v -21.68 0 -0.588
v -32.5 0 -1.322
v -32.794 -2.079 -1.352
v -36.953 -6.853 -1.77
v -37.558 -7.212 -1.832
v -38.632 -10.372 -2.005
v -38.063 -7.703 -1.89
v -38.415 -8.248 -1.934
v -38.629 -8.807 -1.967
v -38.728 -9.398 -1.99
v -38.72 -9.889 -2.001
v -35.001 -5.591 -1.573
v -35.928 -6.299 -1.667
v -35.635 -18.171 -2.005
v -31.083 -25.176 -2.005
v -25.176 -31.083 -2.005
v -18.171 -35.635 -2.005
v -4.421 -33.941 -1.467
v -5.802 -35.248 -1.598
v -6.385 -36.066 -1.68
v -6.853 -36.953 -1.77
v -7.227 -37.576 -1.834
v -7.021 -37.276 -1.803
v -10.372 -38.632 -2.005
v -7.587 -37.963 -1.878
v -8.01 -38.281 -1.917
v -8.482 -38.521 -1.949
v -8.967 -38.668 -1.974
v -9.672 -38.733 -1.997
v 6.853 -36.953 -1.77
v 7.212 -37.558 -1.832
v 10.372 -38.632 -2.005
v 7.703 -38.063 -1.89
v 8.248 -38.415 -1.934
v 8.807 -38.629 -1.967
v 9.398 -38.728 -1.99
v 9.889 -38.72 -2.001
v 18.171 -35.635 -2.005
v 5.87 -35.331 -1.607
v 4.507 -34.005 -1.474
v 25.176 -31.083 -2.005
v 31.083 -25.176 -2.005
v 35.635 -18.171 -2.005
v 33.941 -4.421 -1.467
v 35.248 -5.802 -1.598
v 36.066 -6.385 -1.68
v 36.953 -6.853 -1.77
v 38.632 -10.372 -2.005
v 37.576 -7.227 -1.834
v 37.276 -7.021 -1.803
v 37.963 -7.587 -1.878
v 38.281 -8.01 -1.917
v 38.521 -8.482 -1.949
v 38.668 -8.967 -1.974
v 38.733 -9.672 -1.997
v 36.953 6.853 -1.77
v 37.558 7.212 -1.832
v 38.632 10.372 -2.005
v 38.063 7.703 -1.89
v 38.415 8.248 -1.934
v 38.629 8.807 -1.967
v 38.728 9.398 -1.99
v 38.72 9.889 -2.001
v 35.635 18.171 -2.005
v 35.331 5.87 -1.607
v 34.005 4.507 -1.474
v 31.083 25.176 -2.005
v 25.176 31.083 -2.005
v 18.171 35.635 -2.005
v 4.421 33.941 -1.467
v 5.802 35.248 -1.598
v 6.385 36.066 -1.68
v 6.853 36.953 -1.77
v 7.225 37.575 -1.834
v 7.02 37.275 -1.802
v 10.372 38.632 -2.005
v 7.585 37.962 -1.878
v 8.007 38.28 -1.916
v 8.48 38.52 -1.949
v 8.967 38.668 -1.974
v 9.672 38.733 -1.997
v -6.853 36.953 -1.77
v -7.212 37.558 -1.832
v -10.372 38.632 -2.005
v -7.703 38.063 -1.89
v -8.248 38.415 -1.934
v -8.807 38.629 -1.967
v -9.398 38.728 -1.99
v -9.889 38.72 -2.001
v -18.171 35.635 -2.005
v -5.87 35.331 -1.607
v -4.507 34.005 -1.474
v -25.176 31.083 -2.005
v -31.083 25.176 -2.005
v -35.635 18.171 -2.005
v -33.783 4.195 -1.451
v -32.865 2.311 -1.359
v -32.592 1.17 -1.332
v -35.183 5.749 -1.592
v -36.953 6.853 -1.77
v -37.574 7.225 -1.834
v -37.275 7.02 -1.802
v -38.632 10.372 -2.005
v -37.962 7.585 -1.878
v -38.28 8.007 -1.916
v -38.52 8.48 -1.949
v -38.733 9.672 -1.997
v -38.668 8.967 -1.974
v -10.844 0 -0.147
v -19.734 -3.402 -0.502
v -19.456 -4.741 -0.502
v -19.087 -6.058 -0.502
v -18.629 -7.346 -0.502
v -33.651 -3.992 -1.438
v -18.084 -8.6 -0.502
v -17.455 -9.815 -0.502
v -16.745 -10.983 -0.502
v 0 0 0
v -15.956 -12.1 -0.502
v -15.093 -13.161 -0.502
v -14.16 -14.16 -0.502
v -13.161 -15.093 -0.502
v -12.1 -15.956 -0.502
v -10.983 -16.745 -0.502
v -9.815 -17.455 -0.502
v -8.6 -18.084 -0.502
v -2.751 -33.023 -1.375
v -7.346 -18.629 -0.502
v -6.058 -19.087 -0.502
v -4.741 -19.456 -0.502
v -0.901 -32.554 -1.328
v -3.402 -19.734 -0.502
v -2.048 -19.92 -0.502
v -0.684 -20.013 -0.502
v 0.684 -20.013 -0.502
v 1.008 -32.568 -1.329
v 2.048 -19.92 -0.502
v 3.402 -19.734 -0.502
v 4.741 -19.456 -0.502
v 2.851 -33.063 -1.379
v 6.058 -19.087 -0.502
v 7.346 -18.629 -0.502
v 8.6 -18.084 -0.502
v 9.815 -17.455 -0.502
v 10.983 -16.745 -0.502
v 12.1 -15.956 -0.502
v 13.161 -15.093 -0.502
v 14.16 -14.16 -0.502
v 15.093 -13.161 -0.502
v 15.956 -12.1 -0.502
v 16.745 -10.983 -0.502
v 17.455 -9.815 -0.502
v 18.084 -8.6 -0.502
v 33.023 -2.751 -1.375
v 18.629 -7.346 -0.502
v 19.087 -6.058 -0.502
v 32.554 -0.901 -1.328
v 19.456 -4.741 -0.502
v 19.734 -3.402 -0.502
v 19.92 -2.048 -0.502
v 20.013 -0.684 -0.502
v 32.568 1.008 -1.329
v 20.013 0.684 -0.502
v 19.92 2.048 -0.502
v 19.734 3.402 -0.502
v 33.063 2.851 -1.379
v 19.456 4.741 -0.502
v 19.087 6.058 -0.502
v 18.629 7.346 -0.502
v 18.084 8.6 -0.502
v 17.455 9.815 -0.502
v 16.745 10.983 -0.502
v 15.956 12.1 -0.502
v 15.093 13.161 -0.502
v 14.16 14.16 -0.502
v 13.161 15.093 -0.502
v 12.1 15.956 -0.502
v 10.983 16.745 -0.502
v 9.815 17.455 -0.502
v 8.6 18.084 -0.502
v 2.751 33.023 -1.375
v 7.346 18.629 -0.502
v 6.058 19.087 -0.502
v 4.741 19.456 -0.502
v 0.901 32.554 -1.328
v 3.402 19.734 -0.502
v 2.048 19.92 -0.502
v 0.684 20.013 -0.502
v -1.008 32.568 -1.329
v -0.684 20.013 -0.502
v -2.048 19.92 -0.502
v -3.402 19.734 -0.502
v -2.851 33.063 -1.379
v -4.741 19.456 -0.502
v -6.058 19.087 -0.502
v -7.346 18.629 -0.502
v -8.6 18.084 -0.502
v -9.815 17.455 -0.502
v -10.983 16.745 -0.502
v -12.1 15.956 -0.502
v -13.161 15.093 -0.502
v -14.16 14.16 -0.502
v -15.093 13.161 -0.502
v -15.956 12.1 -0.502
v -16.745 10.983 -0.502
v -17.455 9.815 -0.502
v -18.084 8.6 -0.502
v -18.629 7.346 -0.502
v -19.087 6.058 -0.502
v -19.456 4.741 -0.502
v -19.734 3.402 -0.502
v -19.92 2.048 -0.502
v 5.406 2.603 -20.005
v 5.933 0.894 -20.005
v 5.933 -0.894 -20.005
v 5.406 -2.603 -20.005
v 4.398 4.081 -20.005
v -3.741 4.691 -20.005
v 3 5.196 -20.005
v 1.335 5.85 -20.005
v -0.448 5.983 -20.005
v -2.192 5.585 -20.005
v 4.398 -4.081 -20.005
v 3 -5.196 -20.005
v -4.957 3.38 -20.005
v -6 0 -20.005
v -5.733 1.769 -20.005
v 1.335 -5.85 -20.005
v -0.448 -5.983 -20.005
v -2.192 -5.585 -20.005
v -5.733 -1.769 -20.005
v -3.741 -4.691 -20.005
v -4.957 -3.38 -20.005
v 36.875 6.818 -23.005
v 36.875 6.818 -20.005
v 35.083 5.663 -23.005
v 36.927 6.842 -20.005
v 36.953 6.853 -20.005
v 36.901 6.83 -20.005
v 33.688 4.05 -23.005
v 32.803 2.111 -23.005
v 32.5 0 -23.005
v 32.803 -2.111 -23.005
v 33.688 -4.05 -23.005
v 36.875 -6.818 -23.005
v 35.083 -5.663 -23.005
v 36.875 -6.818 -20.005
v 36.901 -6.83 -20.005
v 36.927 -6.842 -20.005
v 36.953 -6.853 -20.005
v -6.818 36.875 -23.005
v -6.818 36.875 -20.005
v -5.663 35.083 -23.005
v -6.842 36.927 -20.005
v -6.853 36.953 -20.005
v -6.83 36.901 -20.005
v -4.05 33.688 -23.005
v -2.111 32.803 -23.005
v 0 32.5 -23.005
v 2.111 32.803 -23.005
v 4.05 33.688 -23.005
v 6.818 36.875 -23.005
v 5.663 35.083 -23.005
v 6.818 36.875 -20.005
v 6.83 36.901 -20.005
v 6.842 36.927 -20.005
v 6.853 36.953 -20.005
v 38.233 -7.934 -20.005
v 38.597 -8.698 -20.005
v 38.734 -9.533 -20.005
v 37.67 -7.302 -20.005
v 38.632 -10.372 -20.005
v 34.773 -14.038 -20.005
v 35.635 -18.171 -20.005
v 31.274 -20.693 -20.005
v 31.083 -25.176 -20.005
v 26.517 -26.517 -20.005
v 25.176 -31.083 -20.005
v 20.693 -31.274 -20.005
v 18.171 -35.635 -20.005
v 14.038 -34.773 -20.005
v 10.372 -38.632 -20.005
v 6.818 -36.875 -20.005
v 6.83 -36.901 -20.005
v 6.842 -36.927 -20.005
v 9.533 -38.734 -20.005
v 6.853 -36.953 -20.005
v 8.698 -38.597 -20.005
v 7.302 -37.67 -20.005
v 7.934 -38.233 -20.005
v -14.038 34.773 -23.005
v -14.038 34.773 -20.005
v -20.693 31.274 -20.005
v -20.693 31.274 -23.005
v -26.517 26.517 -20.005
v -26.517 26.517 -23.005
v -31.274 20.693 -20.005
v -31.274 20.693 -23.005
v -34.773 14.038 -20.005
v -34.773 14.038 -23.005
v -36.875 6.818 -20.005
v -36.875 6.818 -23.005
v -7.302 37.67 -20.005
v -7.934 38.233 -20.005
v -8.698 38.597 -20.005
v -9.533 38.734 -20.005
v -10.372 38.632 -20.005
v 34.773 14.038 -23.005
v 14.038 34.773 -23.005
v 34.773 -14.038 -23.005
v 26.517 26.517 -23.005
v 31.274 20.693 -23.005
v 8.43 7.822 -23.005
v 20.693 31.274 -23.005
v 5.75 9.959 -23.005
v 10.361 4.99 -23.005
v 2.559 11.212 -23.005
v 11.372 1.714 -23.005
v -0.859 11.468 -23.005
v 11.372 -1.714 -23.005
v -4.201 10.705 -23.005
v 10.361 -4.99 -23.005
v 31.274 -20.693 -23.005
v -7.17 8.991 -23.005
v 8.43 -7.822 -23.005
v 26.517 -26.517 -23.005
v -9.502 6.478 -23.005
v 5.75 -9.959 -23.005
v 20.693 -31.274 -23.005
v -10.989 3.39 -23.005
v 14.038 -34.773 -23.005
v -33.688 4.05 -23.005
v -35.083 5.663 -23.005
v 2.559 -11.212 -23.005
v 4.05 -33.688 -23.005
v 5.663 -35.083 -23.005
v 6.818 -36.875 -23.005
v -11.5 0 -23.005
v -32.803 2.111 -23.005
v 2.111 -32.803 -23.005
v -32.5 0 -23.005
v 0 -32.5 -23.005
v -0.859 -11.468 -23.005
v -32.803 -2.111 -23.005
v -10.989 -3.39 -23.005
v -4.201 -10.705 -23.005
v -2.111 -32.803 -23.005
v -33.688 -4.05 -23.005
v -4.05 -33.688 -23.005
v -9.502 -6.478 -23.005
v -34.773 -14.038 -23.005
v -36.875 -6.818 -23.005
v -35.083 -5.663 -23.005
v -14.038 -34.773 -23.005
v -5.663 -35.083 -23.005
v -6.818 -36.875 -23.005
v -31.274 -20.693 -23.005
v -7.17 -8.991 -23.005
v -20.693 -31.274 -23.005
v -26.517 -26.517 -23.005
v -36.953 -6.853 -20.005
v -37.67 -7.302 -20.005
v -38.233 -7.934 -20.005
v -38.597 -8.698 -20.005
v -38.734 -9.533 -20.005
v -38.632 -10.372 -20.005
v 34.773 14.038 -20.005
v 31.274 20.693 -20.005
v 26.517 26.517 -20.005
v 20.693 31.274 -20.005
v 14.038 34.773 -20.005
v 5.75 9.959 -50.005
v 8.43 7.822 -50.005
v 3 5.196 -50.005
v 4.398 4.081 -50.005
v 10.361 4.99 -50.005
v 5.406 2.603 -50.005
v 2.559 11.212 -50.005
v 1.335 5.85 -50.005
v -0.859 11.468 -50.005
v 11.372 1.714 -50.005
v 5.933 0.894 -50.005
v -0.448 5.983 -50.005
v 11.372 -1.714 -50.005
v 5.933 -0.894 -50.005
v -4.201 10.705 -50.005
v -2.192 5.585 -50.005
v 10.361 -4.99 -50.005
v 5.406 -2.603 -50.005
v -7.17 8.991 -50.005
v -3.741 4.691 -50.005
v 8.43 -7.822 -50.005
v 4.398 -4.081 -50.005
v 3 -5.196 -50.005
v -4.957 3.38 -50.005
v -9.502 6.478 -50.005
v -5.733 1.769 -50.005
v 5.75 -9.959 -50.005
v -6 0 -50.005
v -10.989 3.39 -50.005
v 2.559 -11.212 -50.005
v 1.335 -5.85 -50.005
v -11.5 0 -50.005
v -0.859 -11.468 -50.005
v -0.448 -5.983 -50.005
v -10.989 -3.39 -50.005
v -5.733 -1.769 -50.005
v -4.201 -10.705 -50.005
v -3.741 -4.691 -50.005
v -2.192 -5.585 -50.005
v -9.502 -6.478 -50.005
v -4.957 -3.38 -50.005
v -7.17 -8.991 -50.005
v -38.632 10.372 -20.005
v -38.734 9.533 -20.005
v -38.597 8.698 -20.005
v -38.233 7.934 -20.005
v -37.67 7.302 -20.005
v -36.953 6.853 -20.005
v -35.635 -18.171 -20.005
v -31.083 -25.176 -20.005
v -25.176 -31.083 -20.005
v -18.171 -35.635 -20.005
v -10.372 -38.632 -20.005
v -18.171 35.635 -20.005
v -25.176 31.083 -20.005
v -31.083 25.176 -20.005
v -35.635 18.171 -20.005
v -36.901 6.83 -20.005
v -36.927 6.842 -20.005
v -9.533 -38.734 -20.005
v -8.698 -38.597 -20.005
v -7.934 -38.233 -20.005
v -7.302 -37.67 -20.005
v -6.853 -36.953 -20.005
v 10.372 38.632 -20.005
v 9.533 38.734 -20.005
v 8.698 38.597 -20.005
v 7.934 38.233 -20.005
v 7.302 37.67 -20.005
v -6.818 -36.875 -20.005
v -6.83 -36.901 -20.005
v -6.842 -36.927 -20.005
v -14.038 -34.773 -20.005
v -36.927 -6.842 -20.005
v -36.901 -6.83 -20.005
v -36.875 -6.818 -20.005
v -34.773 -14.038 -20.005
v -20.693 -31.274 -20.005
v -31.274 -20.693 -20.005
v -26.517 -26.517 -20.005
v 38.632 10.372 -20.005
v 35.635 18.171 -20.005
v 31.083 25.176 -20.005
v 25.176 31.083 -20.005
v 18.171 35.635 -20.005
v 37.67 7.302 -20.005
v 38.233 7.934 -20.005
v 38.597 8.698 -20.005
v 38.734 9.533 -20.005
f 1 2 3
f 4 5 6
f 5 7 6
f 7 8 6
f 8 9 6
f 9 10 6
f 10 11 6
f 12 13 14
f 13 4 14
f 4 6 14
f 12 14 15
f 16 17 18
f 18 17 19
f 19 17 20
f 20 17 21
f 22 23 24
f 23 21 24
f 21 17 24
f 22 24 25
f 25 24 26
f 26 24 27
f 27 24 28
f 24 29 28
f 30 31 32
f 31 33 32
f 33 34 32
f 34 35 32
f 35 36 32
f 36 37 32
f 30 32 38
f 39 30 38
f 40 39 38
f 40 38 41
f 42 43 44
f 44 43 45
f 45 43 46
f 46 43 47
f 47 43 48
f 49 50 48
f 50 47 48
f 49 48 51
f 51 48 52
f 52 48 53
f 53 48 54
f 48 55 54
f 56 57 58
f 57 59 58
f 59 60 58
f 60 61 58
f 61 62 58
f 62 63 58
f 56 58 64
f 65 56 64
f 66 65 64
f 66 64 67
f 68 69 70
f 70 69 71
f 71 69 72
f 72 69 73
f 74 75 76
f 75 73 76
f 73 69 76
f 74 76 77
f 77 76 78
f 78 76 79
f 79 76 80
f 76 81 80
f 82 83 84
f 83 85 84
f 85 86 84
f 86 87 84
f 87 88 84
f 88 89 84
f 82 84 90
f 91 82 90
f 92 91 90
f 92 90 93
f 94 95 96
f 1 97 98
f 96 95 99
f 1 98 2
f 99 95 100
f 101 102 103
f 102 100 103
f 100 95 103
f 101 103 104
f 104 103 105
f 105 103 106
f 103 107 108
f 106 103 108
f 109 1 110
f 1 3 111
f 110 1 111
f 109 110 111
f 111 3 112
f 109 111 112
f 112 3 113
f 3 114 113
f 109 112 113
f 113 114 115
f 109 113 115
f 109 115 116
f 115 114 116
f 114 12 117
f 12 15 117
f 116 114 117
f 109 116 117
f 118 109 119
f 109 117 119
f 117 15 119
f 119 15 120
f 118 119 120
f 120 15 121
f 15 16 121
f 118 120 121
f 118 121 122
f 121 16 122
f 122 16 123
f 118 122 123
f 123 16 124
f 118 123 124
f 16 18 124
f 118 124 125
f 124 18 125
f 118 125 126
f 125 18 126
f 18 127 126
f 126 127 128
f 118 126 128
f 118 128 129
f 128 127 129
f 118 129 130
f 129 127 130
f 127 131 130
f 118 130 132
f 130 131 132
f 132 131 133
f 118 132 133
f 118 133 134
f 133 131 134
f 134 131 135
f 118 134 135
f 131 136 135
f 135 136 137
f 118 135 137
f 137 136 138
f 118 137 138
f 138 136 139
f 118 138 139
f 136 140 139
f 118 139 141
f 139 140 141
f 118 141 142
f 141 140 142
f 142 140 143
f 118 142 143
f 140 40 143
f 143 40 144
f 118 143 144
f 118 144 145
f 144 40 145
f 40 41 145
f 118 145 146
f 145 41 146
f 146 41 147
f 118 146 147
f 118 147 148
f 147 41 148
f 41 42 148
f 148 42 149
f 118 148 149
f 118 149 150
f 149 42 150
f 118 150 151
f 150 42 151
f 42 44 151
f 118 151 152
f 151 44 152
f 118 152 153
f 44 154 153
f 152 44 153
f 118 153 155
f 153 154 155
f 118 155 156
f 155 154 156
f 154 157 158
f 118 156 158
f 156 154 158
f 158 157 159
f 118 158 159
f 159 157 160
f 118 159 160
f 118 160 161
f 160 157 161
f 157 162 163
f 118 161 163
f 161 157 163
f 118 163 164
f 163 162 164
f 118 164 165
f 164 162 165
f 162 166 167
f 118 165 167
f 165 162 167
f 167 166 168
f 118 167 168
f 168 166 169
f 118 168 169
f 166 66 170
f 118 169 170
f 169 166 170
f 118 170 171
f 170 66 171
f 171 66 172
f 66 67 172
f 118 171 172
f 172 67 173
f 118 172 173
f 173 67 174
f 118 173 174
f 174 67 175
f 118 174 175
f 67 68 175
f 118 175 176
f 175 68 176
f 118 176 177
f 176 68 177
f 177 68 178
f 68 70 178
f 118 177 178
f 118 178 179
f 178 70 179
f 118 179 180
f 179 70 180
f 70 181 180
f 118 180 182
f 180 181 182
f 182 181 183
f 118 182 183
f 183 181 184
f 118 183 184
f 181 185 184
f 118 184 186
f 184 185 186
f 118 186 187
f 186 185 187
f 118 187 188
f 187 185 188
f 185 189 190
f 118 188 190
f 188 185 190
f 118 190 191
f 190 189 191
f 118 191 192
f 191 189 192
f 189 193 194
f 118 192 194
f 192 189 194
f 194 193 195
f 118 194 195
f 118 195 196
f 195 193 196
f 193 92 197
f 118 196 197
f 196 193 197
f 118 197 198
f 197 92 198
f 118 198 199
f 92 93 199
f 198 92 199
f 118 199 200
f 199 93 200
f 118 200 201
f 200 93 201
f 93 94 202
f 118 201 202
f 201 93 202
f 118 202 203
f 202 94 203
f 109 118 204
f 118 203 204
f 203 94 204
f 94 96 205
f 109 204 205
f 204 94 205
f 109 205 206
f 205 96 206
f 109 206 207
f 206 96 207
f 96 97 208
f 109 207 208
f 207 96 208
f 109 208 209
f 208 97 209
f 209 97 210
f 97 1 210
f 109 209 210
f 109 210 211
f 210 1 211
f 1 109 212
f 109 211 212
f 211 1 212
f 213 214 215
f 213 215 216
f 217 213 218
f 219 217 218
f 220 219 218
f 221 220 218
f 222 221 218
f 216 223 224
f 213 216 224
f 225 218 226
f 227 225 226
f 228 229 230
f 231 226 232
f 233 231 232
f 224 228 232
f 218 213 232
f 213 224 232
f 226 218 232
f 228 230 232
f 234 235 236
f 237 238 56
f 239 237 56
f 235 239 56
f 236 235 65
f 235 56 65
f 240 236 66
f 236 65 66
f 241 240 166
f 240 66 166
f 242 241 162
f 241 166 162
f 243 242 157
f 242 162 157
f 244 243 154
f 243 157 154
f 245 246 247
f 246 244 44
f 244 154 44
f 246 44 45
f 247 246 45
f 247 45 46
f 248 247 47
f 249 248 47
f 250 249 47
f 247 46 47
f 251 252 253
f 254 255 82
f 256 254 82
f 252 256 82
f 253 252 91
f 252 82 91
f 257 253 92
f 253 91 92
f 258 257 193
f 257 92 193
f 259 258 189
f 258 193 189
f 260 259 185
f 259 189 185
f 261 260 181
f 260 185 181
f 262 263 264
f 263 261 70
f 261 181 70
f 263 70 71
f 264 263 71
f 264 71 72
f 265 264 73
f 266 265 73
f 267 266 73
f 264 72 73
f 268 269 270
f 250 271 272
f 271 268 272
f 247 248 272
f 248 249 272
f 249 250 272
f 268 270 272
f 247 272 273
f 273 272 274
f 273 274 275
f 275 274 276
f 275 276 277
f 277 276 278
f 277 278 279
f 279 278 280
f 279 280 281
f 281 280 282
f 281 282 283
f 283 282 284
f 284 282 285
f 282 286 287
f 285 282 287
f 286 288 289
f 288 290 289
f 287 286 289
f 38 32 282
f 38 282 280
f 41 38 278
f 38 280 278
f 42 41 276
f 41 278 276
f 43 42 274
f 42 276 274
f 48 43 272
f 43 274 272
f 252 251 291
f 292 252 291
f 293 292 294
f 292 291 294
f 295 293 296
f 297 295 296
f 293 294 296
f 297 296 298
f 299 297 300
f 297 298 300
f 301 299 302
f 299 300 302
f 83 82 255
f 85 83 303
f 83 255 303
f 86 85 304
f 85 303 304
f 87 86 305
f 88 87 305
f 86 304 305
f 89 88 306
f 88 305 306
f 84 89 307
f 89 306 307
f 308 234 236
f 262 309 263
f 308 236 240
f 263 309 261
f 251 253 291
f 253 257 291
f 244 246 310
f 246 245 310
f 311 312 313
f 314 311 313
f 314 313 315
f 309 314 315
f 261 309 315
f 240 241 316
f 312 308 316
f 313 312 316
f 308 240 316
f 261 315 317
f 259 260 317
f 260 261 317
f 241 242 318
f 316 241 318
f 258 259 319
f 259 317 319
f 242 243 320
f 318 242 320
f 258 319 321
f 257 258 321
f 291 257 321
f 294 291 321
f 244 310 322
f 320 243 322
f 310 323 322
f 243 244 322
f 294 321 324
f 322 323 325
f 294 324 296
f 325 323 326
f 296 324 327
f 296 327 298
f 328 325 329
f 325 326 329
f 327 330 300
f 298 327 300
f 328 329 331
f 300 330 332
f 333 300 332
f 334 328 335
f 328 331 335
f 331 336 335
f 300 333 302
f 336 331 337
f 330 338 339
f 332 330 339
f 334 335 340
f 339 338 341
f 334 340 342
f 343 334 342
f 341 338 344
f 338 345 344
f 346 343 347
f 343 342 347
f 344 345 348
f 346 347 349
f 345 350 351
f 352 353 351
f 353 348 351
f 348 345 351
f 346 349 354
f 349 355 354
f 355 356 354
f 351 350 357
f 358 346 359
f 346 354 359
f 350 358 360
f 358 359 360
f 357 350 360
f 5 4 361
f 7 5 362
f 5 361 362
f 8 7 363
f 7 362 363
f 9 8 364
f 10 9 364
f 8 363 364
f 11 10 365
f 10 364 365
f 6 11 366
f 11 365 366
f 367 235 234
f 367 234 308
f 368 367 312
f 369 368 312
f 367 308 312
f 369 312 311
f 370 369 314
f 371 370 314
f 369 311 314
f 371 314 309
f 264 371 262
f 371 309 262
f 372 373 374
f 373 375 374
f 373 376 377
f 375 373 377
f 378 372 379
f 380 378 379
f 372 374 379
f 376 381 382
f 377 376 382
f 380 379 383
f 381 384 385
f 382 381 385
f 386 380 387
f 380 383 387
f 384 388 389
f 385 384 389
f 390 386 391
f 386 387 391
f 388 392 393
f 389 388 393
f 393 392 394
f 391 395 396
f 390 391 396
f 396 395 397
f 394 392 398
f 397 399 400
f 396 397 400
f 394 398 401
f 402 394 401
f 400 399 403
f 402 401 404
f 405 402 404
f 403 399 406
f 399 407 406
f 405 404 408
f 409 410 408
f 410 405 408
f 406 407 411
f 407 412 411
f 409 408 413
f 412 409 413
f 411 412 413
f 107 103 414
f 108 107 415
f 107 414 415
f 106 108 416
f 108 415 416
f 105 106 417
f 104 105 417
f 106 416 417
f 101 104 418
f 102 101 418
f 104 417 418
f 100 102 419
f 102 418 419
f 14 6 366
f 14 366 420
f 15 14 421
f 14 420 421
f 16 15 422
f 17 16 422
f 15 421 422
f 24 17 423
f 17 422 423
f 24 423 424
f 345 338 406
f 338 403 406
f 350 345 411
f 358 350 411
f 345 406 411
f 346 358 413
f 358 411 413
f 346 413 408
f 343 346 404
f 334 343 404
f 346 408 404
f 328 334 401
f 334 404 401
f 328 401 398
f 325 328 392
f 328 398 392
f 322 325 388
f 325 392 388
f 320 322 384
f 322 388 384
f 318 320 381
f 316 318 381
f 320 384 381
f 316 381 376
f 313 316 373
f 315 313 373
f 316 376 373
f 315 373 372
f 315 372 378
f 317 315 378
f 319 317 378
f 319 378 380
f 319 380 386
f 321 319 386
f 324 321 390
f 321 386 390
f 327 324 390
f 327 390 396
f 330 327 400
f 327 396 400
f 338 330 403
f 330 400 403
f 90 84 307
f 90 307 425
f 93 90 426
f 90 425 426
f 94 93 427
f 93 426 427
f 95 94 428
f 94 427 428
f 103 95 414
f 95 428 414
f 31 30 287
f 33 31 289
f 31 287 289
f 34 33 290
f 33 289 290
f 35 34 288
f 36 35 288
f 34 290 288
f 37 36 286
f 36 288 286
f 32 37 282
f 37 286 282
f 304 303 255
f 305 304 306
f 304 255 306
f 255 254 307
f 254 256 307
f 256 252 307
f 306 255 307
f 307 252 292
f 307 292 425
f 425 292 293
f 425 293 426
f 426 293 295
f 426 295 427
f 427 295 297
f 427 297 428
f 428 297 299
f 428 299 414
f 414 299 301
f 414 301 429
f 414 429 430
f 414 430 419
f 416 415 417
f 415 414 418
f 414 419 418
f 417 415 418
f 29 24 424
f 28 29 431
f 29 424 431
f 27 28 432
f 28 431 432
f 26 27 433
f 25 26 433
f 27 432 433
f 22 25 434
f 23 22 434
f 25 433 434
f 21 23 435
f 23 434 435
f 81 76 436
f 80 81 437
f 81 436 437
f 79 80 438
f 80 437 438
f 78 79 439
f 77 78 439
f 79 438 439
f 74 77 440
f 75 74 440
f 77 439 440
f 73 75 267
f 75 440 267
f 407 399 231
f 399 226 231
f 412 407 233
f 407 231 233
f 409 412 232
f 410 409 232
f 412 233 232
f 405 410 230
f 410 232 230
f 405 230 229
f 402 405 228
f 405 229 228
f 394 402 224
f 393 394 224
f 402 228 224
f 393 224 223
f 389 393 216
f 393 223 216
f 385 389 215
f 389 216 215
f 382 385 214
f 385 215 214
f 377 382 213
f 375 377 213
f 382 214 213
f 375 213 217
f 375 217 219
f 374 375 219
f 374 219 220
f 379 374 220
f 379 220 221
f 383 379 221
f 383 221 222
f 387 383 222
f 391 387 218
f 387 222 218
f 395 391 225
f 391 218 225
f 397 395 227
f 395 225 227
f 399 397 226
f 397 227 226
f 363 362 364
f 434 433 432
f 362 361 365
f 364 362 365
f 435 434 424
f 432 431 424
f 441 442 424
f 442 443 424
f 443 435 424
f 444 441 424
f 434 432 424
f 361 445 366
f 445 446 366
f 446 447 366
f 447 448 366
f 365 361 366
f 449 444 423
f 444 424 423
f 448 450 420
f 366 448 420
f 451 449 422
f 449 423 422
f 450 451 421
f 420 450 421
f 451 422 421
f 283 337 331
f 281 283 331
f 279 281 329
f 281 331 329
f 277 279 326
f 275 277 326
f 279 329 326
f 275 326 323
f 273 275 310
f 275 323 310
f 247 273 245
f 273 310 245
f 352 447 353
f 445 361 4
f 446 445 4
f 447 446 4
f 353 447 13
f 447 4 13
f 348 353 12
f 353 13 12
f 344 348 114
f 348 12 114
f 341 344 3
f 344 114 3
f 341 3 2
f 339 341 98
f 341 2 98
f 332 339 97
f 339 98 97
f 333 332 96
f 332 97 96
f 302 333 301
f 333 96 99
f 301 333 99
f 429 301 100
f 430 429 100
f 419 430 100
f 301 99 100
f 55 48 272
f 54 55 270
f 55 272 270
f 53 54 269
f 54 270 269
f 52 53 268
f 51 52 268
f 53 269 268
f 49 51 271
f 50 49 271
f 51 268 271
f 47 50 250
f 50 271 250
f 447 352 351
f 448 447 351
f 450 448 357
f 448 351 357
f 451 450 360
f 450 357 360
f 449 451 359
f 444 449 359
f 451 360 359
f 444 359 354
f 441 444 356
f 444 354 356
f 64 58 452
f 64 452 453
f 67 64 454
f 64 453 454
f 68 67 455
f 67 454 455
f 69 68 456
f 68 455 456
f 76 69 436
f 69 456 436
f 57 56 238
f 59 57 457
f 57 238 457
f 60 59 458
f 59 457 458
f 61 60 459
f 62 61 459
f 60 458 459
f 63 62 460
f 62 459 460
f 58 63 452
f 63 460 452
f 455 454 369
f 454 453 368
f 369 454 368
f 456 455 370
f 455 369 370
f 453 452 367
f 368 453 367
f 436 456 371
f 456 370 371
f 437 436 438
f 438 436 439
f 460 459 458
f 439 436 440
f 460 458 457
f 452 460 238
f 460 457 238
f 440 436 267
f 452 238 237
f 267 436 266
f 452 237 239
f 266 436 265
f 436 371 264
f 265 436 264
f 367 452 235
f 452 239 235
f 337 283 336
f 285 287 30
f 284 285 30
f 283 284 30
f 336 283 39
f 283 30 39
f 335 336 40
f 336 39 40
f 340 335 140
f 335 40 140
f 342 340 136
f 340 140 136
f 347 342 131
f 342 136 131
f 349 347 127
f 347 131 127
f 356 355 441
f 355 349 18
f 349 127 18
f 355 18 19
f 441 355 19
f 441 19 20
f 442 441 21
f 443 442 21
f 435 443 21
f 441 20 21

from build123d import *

# Parameters (mm, degrees)
CUT_EXTRUDE1_REACH = 77.502
SKETCH2_R          = 7.5
FILLET1_R          = 3


with BuildPart() as part:
    # Sketch1 → Revolve1 (revolve)
    with BuildSketch(Plane(origin=(0, 0, 0), x_dir=(1, 0, 0), z_dir=(0, 1, 0))):
        with BuildLine():
            Line((0, 20.005025157), (0, 0))
            ThreePointArc((0, 0), (-20.025110024, 0.501570756), (-40, 2.005025157))
            Line((-40, 2.005025157), (-40, 20.005025157))
            Line((-40, 20.005025157), (-37.5, 20.005025157))
            Line((-37.5, 20.005025157), (-37.5, 23.005025157))
            Line((-37.5, 23.005025157), (-11.5, 23.005025157))
            Line((-11.5, 23.005025157), (-11.5, 50.005025157))
            Line((-11.5, 50.005025157), (-6, 50.005025157))
            Line((-6, 50.005025157), (-6, 20.005025157))
            Line((-6, 20.005025157), (0, 20.005025157))
        make_face()
    revolve(axis=Axis((0, 0, -358.843484937), (0, 0, 1)))

    # Sketch2 → Cut-Extrude1 (cut, up to next)
    with BuildSketch(Plane.XY, mode=Mode.PRIVATE) as cut_extrude1_sk1:
        with Locations((0, 40)):
            Circle(SKETCH2_R)
    cut_extrude1_tool1 = extrude(cut_extrude1_sk1.sketch, amount=-CUT_EXTRUDE1_REACH, mode=Mode.PRIVATE) & part.part
    # Sketch2 → Cut-Extrude1 (cut, up to next)
    with BuildSketch(Plane.XY, mode=Mode.PRIVATE) as cut_extrude1_sk2:
        with Locations((40, 0)):
            Circle(SKETCH2_R)
    cut_extrude1_tool2 = extrude(cut_extrude1_sk2.sketch, amount=-CUT_EXTRUDE1_REACH, mode=Mode.PRIVATE) & part.part
    # Sketch2 → Cut-Extrude1 (cut, up to next)
    with BuildSketch(Plane.XY, mode=Mode.PRIVATE) as cut_extrude1_sk3:
        with Locations((0, -40)):
            Circle(SKETCH2_R)
    cut_extrude1_tool3 = extrude(cut_extrude1_sk3.sketch, amount=-CUT_EXTRUDE1_REACH, mode=Mode.PRIVATE) & part.part
    # Sketch2 → Cut-Extrude1 (cut, up to next)
    with BuildSketch(Plane.XY, mode=Mode.PRIVATE) as cut_extrude1_sk4:
        with Locations((-40, 0)):
            Circle(SKETCH2_R)
    cut_extrude1_tool4 = extrude(cut_extrude1_sk4.sketch, amount=-CUT_EXTRUDE1_REACH, mode=Mode.PRIVATE) & part.part
    add(cut_extrude1_tool1.solids().sort_by_distance((0, 40, 0))[0], mode=Mode.SUBTRACT)
    add(cut_extrude1_tool2.solids().sort_by_distance((40, 0, 0))[0], mode=Mode.SUBTRACT)
    add(cut_extrude1_tool3.solids().sort_by_distance((0, -40, 0))[0], mode=Mode.SUBTRACT)
    add(cut_extrude1_tool4.solids().sort_by_distance((-40, 0, 0))[0], mode=Mode.SUBTRACT)

    # Fillet1
    # the kernel refuses this fillet: 3 mm, written as the material it takes off along each edge
    with BuildSketch(Plane(origin=(-39.296875, -7.466968276, -27.456580588), x_dir=(0.9673809008255011, 0.25332625745872106, 0), z_dir=(0, 0, 1))) as fillet1_piece_1:
        with BuildLine():
            CenterArc((2.907334637, -2.960609009), FILLET1_R, 99.295051663, 81.059690814)
            ThreePointArc((-0.092607863, -2.979183163), (-0.074063004, -1.488728691), (0, 0))
            ThreePointArc((0, 0), (1.211389432, -0.098477478), (2.422778864, 0))
        make_face()
    extrude(amount=32.903111461, mode=Mode.SUBTRACT)
    with BuildSketch(Plane(origin=(-39.296875, 7.466968276, -27.456580588), x_dir=(0.967380900825501, -0.25332625745872067, 0), z_dir=(0, 0, 1))) as fillet1_piece_2:
        with BuildLine():
            CenterArc((2.907334637, 2.960609009), FILLET1_R, 179.645257523, 81.059690814)
            ThreePointArc((-0.092607863, 2.979183163), (-0.074063004, 1.488728691), (0, 0))
            ThreePointArc((0, 0), (1.211389432, 0.098477478), (2.422778864, 0))
        make_face()
    extrude(amount=32.903110861, mode=Mode.SUBTRACT)
    with BuildSketch(Plane(origin=(7.466968276, -39.296875, -27.456580588), x_dir=(-0.2533262574587217, 0.9673809008255008, 0), z_dir=(0, 0, 1)), Plane(origin=(39.296875, 7.466968276, -27.456580588), x_dir=(-0.9673809008255009, -0.25332625745872134, 0), z_dir=(0, 0, 1)), Plane(origin=(-7.466968276, 39.296875, -27.456580588), x_dir=(0.2533262574587217, -0.9673809008255008, 0), z_dir=(0, 0, 1))) as fillet1_piece_3:
        with BuildLine():
            CenterArc((2.907334637, -2.960609009), FILLET1_R, 99.295051663, 81.059690814)
            ThreePointArc((-0.092607863, -2.979183163), (-0.074063004, -1.488728691), (0, 0))
            ThreePointArc((0, 0), (1.211389432, -0.098477478), (2.422778864, 0))
        make_face()
    extrude(amount=32.903110861, mode=Mode.SUBTRACT)
    with BuildSketch(Plane(origin=(-7.466968276, -39.296875, -27.456580588), x_dir=(-0.974784701688693, 0.22314745204390218, 0), z_dir=(0, 0, 1)), Plane(origin=(39.296875, -7.466968276, -27.456580588), x_dir=(-0.2231474520439016, -0.9747847016886931, 0), z_dir=(0, 0, 1)), Plane(origin=(7.466968276, 39.296875, -27.456580588), x_dir=(0.9747847016886936, -0.22314745204390027, 0), z_dir=(0, 0, 1))) as fillet1_piece_4:
        with BuildLine():
            CenterArc((2.868848841, -2.997917064), FILLET1_R, 87.864792425, 81.059690814)
            ThreePointArc((-0.075275684, -2.421609175), (0.060792092, -1.21386428), (0, 0))
            ThreePointArc((0, 0), (1.490311086, 0.027772481), (2.980622172, 0))
        make_face()
    extrude(amount=32.903110861, mode=Mode.SUBTRACT)


solid = part.part
